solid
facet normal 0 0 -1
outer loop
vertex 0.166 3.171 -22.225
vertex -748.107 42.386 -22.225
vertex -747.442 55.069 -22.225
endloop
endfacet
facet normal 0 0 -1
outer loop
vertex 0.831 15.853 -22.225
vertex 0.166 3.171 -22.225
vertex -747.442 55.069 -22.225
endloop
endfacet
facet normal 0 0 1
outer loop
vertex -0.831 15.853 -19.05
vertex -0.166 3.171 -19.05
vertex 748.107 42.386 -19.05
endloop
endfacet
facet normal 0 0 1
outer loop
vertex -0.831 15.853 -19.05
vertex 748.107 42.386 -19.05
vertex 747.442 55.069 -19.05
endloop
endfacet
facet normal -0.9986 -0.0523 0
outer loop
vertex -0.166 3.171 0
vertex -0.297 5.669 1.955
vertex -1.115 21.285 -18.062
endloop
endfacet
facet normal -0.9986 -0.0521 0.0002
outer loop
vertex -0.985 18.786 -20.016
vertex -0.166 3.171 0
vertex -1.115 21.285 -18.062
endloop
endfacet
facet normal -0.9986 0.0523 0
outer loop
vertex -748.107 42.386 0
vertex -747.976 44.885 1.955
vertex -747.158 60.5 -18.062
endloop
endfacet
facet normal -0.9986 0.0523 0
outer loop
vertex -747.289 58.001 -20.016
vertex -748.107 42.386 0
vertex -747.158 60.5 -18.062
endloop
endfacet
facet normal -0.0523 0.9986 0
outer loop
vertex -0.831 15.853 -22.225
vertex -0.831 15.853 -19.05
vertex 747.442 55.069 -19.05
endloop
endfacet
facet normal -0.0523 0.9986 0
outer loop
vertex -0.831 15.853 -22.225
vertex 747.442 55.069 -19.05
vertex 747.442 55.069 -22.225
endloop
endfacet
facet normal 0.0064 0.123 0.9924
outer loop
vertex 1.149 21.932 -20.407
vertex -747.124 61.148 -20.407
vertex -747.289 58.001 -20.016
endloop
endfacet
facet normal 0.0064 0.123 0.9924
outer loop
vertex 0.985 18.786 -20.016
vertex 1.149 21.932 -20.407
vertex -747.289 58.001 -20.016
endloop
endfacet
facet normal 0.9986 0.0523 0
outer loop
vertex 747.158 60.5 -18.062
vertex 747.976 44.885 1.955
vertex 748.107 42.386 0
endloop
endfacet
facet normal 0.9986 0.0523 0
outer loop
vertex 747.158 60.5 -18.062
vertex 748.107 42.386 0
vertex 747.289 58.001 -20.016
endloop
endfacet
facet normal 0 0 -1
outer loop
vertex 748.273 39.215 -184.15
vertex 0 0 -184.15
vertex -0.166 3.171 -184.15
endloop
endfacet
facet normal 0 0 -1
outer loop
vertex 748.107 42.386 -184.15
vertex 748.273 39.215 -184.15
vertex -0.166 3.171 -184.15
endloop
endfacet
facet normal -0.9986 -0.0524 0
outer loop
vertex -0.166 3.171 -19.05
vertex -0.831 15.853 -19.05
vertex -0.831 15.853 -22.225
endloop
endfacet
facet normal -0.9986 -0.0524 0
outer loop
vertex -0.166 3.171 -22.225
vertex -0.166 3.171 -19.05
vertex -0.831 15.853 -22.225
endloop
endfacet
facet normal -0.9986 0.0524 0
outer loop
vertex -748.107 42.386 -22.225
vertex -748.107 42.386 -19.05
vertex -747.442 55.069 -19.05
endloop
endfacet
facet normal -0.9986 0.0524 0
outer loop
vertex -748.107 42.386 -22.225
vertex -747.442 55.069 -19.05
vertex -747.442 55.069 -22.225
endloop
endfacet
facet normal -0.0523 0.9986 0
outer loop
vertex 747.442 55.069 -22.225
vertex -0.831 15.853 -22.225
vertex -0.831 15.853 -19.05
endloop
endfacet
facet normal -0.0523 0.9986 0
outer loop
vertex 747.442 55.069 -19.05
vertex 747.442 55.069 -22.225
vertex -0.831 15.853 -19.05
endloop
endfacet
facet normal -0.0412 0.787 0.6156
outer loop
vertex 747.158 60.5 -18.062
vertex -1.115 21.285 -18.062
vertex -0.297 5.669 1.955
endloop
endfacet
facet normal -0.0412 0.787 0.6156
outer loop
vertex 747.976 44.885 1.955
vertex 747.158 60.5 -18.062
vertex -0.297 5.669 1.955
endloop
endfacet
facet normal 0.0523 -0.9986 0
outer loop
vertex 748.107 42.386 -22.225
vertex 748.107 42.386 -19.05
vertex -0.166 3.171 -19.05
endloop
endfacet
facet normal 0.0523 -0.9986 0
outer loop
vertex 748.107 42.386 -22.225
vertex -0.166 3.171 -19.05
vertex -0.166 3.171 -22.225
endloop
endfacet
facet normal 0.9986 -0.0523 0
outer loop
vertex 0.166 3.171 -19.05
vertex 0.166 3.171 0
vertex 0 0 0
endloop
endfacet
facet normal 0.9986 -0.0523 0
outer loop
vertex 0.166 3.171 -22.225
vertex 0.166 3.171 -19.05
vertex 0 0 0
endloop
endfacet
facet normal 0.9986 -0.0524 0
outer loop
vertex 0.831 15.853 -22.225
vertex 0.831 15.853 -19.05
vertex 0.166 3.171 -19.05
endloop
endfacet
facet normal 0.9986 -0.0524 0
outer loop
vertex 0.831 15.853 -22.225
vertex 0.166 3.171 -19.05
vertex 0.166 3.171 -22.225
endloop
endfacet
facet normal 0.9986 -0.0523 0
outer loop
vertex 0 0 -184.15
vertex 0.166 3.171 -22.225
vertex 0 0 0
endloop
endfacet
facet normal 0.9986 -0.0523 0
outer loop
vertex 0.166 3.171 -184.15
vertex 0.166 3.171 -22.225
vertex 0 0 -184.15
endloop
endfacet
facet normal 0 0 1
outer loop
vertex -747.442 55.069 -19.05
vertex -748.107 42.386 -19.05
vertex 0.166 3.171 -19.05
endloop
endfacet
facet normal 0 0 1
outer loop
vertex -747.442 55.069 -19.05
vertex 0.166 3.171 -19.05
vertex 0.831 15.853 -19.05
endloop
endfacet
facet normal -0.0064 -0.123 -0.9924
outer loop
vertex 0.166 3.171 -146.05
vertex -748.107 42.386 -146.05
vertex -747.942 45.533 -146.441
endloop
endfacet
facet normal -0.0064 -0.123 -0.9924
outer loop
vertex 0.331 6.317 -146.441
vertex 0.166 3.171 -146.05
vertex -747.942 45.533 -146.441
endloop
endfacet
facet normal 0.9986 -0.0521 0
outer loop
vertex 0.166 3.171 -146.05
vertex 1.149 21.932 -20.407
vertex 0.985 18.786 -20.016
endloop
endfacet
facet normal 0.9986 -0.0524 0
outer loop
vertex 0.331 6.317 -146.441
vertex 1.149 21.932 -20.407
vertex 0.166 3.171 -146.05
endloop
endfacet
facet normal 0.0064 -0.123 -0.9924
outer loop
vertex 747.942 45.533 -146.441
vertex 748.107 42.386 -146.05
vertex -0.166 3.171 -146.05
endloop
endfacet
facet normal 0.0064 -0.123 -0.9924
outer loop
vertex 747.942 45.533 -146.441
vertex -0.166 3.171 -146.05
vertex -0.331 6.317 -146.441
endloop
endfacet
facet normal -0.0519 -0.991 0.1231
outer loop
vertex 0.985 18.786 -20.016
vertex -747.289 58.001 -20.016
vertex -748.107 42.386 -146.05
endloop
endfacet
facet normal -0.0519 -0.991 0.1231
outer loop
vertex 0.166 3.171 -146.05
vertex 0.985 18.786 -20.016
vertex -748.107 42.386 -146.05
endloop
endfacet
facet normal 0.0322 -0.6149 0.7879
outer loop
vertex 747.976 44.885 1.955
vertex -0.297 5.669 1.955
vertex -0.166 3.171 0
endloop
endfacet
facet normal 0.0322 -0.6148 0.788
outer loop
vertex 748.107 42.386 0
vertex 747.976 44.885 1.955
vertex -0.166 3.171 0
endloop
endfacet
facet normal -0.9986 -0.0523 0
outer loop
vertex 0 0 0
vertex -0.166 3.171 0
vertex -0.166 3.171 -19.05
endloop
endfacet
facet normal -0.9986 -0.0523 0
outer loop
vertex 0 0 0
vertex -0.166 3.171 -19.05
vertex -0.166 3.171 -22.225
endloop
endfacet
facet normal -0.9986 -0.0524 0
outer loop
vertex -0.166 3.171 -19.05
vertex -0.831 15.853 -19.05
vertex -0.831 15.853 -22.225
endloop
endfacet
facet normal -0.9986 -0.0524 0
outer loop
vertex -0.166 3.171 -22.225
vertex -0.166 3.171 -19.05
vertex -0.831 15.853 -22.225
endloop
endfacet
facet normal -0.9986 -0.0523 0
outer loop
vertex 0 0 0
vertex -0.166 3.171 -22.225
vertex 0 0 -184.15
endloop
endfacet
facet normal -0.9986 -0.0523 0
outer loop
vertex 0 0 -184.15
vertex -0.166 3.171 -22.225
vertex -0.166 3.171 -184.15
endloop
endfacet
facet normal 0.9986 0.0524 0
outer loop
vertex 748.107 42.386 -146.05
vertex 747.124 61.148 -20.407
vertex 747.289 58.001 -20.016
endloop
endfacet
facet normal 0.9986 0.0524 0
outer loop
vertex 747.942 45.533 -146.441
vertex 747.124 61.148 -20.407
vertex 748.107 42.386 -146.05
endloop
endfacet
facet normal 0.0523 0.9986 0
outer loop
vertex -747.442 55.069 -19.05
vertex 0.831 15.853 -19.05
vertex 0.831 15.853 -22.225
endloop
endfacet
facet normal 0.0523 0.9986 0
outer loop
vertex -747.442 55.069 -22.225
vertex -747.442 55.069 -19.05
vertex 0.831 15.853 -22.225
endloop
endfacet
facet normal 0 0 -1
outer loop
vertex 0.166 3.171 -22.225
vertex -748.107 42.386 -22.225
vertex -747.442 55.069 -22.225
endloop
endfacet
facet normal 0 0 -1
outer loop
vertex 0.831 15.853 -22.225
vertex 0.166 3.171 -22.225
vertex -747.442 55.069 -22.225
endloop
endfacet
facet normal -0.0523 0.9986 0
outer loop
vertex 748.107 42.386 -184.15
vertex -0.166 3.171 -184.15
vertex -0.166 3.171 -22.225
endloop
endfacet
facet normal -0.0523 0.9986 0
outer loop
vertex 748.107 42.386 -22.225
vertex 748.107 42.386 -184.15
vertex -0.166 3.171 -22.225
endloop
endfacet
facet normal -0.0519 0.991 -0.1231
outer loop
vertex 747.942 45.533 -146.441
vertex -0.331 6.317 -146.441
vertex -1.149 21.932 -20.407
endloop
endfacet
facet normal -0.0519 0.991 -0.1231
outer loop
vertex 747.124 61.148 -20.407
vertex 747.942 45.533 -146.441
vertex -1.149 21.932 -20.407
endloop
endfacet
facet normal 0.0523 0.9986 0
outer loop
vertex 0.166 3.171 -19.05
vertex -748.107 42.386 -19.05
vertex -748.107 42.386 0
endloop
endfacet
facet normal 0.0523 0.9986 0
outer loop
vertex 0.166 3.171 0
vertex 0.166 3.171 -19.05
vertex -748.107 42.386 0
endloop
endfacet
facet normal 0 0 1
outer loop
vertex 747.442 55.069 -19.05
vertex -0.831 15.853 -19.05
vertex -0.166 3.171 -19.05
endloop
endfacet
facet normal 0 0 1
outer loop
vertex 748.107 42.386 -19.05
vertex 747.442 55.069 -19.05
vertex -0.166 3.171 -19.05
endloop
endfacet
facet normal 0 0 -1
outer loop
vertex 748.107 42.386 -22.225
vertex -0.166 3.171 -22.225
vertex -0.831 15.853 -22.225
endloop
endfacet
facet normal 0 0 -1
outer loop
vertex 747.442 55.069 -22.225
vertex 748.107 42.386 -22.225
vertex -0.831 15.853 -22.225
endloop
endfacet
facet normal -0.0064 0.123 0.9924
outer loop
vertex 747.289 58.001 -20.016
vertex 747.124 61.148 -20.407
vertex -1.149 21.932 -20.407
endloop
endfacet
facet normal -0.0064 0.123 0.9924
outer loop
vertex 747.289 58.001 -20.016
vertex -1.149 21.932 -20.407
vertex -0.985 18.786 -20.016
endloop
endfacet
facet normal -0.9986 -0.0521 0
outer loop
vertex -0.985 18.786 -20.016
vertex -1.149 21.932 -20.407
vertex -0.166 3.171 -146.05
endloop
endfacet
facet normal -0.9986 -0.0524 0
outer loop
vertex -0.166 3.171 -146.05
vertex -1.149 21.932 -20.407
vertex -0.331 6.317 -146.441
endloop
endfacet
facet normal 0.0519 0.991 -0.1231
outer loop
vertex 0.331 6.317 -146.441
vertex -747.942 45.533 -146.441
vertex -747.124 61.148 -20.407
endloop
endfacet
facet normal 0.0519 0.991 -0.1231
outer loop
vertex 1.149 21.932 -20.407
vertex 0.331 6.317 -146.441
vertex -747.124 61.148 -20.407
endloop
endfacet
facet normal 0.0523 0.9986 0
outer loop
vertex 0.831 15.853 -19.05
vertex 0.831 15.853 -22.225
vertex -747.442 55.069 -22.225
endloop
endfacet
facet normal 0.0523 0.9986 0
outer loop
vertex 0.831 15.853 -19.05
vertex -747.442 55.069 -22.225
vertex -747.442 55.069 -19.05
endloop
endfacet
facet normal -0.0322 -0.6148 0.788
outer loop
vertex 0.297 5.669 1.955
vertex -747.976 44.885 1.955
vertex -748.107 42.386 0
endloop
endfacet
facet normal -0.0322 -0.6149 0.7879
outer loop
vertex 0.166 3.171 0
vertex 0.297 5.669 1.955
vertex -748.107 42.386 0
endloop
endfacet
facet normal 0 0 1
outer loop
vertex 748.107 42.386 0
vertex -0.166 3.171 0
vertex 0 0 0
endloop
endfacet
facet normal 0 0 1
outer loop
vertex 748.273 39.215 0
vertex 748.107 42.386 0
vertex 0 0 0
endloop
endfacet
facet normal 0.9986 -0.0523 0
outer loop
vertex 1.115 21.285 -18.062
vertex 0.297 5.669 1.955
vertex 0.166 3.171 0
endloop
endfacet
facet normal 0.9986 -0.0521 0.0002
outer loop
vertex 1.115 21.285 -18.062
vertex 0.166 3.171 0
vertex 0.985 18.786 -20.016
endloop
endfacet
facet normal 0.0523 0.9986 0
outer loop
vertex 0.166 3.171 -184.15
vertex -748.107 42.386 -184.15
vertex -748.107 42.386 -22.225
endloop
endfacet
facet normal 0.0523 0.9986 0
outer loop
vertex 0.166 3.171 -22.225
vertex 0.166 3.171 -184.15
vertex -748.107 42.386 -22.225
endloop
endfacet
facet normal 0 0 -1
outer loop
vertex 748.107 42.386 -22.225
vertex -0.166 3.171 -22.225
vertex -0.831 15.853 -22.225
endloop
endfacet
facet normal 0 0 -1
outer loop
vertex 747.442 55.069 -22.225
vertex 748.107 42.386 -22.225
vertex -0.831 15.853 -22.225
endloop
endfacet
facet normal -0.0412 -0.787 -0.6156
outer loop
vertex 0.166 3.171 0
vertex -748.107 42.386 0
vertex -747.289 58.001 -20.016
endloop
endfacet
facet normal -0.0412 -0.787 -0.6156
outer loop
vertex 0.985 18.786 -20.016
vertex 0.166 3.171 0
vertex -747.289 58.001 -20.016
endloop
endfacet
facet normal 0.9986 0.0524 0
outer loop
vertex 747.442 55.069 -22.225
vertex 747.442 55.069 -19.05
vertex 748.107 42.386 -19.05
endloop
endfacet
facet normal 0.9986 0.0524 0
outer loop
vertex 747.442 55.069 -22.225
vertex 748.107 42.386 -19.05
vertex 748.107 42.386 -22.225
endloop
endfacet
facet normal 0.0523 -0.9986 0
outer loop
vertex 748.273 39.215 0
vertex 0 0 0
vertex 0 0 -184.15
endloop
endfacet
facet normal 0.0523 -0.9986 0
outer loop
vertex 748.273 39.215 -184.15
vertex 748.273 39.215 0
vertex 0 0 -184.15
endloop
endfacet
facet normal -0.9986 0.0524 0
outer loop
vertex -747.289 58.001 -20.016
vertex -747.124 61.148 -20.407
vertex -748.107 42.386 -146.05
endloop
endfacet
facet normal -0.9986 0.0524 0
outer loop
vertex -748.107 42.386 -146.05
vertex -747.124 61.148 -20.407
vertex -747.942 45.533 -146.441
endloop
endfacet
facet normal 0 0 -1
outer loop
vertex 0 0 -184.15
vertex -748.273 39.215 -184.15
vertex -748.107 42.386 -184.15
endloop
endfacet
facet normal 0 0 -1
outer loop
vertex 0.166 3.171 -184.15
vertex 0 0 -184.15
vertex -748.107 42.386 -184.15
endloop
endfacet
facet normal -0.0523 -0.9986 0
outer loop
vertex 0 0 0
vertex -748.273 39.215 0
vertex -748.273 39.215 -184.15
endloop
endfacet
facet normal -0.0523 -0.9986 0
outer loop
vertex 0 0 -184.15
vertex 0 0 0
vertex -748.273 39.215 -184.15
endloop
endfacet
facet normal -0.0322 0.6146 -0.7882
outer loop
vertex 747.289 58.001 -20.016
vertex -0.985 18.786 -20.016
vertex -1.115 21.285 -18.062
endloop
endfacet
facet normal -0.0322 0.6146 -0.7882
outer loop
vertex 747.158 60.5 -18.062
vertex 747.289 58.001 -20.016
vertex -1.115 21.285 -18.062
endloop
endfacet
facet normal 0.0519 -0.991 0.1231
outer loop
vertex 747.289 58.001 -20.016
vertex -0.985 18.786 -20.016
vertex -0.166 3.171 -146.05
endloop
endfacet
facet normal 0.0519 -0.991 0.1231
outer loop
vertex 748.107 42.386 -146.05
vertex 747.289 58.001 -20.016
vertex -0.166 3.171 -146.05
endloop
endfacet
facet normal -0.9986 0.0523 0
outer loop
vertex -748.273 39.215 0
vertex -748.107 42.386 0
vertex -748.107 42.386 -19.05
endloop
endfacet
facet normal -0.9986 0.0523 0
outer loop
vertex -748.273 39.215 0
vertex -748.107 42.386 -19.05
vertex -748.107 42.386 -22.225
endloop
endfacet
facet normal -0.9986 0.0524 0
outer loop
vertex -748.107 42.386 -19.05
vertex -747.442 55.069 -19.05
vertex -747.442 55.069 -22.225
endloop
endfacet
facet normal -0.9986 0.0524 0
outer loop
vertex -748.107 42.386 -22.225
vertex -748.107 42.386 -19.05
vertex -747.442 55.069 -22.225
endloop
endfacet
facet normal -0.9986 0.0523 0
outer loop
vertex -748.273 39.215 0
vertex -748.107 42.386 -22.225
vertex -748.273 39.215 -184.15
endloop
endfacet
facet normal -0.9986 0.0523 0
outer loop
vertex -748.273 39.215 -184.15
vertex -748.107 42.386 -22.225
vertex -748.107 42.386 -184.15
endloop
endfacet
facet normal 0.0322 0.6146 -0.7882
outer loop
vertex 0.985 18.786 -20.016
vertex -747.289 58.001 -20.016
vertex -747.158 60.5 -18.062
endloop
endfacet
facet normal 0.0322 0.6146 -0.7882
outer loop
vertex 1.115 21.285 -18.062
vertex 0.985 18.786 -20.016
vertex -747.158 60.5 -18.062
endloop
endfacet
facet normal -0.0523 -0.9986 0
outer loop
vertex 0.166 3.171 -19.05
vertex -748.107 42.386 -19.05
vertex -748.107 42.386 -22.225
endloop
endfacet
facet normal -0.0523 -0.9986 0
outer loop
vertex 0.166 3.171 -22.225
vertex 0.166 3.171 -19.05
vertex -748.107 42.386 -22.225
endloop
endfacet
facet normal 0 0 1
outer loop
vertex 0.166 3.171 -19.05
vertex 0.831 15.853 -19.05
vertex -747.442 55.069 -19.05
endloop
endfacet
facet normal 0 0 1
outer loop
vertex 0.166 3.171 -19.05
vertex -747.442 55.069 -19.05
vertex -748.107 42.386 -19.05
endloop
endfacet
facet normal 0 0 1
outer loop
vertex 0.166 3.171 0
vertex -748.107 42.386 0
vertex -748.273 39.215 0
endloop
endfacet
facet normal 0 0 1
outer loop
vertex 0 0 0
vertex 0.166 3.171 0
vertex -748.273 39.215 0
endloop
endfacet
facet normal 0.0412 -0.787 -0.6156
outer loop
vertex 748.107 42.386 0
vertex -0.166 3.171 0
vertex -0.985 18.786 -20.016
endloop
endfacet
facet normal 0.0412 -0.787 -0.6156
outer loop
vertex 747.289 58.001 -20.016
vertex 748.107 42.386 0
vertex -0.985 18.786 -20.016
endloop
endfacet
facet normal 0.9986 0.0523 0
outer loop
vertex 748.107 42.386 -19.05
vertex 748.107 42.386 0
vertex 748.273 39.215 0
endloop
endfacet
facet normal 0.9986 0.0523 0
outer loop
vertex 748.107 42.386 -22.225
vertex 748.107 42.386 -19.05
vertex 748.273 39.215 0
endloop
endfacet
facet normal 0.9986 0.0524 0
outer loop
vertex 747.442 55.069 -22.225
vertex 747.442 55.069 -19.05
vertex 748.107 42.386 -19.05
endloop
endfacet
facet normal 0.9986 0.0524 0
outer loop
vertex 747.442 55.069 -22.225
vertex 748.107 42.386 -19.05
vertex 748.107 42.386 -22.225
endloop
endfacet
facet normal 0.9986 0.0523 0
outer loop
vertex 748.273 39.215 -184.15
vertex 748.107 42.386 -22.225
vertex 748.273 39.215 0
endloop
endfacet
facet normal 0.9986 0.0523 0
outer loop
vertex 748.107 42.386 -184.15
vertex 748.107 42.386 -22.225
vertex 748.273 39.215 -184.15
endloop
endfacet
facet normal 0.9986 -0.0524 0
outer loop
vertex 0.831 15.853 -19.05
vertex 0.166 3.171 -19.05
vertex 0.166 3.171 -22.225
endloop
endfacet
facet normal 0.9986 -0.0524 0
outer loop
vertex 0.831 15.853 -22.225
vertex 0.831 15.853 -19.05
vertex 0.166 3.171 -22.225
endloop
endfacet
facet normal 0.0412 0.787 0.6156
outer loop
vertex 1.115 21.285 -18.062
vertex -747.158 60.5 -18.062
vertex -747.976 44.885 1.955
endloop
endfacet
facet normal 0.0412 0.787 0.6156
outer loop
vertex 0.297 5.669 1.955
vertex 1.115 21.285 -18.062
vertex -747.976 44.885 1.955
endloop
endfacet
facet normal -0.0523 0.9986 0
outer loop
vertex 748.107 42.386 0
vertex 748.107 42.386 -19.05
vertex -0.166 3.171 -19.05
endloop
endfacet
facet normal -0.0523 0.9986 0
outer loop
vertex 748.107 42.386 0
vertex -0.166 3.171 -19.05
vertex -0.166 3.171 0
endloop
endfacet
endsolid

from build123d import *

# Parameters (mm, degrees)
BOSS_EXTRUDE4_DEPTH   = 749.3
BOSS_EXTRUDE4_2_DEPTH = 749.3
BOSS_EXTRUDE4_3_DEPTH = 749.3
SKETCH1_3_W           = 3.175
SKETCH1_3_H           = 12.7
BOSS_EXTRUDE6_DEPTH   = 749.3


with BuildPart() as part:
    # Sketch1 → Boss-Extrude4 (new body)
    with BuildSketch(Plane(origin=(0, 0, 0), x_dir=(0, 0, -1), z_dir=(0.9986295347545743, 0.05233595624293715, 0))):
        Polygon((0, 3.175), (0, 0), (184.15, 0), (184.15, 3.175), (146.05, 3.175), (22.225, 3.175), (22.225, 15.875), (19.05, 15.875), (19.05, 3.175), align=None)
    extrude(amount=BOSS_EXTRUDE4_DEPTH)


with BuildPart() as body_2:
    # Sketch1 → Boss-Extrude4 2 (new body)
    with BuildSketch(Plane(origin=(0, 0, 0), x_dir=(0, 0, -1), z_dir=(0.9986295347545743, 0.05233595624293715, 0))):
        Polygon((-1.95459219, 5.677038043), (0, 3.175), (20.016304348, 18.81173752), (18.061712158, 21.313775563), align=None)
    extrude(amount=BOSS_EXTRUDE4_2_DEPTH)


with BuildPart() as body_3:
    # Sketch1 → Boss-Extrude4 3 (new body)
    with BuildSketch(Plane(origin=(0, 0, 0), x_dir=(0, 0, -1), z_dir=(0.9986295347545743, 0.05233595624293715, 0))):
        Polygon((20.407222786, 21.962579911), (20.016304348, 18.81173752), (146.05, 3.175), (146.440918438, 6.325842391), align=None)
    extrude(amount=BOSS_EXTRUDE4_3_DEPTH)


with BuildPart() as body_4:
    # Sketch1<3> → Boss-Extrude6 (new body)
    with BuildSketch(Plane(origin=(0, 0, 0), x_dir=(0, 0, -1), z_dir=(0.9986295347545743, 0.05233595624293715, 0))):
        with Locations((20.6375, 9.525)):
            Rectangle(SKETCH1_3_W, SKETCH1_3_H)
    extrude(amount=BOSS_EXTRUDE6_DEPTH)


with BuildPart() as body_5:
    # Mirror5: mirrored copy
    add(body_2.part.mirror(Plane(origin=(0, 0, 0), x_dir=(0, 0, 1), z_dir=(1, 0, 0))))


with BuildPart() as body_6:
    # Mirror5 2: mirrored copy
    add(part.part.mirror(Plane(origin=(0, 0, 0), x_dir=(0, 0, 1), z_dir=(1, 0, 0))))


with BuildPart() as body_7:
    # Mirror5 3: mirrored copy
    add(body_4.part.mirror(Plane(origin=(0, 0, 0), x_dir=(0, 0, 1), z_dir=(1, 0, 0))))


with BuildPart() as body_8:
    # Mirror5 4: mirrored copy
    add(body_3.part.mirror(Plane(origin=(0, 0, 0), x_dir=(0, 0, 1), z_dir=(1, 0, 0))))


solid = Compound([part.part, body_2.part, body_3.part, body_4.part, body_5.part, body_6.part, body_7.part, body_8.part])
